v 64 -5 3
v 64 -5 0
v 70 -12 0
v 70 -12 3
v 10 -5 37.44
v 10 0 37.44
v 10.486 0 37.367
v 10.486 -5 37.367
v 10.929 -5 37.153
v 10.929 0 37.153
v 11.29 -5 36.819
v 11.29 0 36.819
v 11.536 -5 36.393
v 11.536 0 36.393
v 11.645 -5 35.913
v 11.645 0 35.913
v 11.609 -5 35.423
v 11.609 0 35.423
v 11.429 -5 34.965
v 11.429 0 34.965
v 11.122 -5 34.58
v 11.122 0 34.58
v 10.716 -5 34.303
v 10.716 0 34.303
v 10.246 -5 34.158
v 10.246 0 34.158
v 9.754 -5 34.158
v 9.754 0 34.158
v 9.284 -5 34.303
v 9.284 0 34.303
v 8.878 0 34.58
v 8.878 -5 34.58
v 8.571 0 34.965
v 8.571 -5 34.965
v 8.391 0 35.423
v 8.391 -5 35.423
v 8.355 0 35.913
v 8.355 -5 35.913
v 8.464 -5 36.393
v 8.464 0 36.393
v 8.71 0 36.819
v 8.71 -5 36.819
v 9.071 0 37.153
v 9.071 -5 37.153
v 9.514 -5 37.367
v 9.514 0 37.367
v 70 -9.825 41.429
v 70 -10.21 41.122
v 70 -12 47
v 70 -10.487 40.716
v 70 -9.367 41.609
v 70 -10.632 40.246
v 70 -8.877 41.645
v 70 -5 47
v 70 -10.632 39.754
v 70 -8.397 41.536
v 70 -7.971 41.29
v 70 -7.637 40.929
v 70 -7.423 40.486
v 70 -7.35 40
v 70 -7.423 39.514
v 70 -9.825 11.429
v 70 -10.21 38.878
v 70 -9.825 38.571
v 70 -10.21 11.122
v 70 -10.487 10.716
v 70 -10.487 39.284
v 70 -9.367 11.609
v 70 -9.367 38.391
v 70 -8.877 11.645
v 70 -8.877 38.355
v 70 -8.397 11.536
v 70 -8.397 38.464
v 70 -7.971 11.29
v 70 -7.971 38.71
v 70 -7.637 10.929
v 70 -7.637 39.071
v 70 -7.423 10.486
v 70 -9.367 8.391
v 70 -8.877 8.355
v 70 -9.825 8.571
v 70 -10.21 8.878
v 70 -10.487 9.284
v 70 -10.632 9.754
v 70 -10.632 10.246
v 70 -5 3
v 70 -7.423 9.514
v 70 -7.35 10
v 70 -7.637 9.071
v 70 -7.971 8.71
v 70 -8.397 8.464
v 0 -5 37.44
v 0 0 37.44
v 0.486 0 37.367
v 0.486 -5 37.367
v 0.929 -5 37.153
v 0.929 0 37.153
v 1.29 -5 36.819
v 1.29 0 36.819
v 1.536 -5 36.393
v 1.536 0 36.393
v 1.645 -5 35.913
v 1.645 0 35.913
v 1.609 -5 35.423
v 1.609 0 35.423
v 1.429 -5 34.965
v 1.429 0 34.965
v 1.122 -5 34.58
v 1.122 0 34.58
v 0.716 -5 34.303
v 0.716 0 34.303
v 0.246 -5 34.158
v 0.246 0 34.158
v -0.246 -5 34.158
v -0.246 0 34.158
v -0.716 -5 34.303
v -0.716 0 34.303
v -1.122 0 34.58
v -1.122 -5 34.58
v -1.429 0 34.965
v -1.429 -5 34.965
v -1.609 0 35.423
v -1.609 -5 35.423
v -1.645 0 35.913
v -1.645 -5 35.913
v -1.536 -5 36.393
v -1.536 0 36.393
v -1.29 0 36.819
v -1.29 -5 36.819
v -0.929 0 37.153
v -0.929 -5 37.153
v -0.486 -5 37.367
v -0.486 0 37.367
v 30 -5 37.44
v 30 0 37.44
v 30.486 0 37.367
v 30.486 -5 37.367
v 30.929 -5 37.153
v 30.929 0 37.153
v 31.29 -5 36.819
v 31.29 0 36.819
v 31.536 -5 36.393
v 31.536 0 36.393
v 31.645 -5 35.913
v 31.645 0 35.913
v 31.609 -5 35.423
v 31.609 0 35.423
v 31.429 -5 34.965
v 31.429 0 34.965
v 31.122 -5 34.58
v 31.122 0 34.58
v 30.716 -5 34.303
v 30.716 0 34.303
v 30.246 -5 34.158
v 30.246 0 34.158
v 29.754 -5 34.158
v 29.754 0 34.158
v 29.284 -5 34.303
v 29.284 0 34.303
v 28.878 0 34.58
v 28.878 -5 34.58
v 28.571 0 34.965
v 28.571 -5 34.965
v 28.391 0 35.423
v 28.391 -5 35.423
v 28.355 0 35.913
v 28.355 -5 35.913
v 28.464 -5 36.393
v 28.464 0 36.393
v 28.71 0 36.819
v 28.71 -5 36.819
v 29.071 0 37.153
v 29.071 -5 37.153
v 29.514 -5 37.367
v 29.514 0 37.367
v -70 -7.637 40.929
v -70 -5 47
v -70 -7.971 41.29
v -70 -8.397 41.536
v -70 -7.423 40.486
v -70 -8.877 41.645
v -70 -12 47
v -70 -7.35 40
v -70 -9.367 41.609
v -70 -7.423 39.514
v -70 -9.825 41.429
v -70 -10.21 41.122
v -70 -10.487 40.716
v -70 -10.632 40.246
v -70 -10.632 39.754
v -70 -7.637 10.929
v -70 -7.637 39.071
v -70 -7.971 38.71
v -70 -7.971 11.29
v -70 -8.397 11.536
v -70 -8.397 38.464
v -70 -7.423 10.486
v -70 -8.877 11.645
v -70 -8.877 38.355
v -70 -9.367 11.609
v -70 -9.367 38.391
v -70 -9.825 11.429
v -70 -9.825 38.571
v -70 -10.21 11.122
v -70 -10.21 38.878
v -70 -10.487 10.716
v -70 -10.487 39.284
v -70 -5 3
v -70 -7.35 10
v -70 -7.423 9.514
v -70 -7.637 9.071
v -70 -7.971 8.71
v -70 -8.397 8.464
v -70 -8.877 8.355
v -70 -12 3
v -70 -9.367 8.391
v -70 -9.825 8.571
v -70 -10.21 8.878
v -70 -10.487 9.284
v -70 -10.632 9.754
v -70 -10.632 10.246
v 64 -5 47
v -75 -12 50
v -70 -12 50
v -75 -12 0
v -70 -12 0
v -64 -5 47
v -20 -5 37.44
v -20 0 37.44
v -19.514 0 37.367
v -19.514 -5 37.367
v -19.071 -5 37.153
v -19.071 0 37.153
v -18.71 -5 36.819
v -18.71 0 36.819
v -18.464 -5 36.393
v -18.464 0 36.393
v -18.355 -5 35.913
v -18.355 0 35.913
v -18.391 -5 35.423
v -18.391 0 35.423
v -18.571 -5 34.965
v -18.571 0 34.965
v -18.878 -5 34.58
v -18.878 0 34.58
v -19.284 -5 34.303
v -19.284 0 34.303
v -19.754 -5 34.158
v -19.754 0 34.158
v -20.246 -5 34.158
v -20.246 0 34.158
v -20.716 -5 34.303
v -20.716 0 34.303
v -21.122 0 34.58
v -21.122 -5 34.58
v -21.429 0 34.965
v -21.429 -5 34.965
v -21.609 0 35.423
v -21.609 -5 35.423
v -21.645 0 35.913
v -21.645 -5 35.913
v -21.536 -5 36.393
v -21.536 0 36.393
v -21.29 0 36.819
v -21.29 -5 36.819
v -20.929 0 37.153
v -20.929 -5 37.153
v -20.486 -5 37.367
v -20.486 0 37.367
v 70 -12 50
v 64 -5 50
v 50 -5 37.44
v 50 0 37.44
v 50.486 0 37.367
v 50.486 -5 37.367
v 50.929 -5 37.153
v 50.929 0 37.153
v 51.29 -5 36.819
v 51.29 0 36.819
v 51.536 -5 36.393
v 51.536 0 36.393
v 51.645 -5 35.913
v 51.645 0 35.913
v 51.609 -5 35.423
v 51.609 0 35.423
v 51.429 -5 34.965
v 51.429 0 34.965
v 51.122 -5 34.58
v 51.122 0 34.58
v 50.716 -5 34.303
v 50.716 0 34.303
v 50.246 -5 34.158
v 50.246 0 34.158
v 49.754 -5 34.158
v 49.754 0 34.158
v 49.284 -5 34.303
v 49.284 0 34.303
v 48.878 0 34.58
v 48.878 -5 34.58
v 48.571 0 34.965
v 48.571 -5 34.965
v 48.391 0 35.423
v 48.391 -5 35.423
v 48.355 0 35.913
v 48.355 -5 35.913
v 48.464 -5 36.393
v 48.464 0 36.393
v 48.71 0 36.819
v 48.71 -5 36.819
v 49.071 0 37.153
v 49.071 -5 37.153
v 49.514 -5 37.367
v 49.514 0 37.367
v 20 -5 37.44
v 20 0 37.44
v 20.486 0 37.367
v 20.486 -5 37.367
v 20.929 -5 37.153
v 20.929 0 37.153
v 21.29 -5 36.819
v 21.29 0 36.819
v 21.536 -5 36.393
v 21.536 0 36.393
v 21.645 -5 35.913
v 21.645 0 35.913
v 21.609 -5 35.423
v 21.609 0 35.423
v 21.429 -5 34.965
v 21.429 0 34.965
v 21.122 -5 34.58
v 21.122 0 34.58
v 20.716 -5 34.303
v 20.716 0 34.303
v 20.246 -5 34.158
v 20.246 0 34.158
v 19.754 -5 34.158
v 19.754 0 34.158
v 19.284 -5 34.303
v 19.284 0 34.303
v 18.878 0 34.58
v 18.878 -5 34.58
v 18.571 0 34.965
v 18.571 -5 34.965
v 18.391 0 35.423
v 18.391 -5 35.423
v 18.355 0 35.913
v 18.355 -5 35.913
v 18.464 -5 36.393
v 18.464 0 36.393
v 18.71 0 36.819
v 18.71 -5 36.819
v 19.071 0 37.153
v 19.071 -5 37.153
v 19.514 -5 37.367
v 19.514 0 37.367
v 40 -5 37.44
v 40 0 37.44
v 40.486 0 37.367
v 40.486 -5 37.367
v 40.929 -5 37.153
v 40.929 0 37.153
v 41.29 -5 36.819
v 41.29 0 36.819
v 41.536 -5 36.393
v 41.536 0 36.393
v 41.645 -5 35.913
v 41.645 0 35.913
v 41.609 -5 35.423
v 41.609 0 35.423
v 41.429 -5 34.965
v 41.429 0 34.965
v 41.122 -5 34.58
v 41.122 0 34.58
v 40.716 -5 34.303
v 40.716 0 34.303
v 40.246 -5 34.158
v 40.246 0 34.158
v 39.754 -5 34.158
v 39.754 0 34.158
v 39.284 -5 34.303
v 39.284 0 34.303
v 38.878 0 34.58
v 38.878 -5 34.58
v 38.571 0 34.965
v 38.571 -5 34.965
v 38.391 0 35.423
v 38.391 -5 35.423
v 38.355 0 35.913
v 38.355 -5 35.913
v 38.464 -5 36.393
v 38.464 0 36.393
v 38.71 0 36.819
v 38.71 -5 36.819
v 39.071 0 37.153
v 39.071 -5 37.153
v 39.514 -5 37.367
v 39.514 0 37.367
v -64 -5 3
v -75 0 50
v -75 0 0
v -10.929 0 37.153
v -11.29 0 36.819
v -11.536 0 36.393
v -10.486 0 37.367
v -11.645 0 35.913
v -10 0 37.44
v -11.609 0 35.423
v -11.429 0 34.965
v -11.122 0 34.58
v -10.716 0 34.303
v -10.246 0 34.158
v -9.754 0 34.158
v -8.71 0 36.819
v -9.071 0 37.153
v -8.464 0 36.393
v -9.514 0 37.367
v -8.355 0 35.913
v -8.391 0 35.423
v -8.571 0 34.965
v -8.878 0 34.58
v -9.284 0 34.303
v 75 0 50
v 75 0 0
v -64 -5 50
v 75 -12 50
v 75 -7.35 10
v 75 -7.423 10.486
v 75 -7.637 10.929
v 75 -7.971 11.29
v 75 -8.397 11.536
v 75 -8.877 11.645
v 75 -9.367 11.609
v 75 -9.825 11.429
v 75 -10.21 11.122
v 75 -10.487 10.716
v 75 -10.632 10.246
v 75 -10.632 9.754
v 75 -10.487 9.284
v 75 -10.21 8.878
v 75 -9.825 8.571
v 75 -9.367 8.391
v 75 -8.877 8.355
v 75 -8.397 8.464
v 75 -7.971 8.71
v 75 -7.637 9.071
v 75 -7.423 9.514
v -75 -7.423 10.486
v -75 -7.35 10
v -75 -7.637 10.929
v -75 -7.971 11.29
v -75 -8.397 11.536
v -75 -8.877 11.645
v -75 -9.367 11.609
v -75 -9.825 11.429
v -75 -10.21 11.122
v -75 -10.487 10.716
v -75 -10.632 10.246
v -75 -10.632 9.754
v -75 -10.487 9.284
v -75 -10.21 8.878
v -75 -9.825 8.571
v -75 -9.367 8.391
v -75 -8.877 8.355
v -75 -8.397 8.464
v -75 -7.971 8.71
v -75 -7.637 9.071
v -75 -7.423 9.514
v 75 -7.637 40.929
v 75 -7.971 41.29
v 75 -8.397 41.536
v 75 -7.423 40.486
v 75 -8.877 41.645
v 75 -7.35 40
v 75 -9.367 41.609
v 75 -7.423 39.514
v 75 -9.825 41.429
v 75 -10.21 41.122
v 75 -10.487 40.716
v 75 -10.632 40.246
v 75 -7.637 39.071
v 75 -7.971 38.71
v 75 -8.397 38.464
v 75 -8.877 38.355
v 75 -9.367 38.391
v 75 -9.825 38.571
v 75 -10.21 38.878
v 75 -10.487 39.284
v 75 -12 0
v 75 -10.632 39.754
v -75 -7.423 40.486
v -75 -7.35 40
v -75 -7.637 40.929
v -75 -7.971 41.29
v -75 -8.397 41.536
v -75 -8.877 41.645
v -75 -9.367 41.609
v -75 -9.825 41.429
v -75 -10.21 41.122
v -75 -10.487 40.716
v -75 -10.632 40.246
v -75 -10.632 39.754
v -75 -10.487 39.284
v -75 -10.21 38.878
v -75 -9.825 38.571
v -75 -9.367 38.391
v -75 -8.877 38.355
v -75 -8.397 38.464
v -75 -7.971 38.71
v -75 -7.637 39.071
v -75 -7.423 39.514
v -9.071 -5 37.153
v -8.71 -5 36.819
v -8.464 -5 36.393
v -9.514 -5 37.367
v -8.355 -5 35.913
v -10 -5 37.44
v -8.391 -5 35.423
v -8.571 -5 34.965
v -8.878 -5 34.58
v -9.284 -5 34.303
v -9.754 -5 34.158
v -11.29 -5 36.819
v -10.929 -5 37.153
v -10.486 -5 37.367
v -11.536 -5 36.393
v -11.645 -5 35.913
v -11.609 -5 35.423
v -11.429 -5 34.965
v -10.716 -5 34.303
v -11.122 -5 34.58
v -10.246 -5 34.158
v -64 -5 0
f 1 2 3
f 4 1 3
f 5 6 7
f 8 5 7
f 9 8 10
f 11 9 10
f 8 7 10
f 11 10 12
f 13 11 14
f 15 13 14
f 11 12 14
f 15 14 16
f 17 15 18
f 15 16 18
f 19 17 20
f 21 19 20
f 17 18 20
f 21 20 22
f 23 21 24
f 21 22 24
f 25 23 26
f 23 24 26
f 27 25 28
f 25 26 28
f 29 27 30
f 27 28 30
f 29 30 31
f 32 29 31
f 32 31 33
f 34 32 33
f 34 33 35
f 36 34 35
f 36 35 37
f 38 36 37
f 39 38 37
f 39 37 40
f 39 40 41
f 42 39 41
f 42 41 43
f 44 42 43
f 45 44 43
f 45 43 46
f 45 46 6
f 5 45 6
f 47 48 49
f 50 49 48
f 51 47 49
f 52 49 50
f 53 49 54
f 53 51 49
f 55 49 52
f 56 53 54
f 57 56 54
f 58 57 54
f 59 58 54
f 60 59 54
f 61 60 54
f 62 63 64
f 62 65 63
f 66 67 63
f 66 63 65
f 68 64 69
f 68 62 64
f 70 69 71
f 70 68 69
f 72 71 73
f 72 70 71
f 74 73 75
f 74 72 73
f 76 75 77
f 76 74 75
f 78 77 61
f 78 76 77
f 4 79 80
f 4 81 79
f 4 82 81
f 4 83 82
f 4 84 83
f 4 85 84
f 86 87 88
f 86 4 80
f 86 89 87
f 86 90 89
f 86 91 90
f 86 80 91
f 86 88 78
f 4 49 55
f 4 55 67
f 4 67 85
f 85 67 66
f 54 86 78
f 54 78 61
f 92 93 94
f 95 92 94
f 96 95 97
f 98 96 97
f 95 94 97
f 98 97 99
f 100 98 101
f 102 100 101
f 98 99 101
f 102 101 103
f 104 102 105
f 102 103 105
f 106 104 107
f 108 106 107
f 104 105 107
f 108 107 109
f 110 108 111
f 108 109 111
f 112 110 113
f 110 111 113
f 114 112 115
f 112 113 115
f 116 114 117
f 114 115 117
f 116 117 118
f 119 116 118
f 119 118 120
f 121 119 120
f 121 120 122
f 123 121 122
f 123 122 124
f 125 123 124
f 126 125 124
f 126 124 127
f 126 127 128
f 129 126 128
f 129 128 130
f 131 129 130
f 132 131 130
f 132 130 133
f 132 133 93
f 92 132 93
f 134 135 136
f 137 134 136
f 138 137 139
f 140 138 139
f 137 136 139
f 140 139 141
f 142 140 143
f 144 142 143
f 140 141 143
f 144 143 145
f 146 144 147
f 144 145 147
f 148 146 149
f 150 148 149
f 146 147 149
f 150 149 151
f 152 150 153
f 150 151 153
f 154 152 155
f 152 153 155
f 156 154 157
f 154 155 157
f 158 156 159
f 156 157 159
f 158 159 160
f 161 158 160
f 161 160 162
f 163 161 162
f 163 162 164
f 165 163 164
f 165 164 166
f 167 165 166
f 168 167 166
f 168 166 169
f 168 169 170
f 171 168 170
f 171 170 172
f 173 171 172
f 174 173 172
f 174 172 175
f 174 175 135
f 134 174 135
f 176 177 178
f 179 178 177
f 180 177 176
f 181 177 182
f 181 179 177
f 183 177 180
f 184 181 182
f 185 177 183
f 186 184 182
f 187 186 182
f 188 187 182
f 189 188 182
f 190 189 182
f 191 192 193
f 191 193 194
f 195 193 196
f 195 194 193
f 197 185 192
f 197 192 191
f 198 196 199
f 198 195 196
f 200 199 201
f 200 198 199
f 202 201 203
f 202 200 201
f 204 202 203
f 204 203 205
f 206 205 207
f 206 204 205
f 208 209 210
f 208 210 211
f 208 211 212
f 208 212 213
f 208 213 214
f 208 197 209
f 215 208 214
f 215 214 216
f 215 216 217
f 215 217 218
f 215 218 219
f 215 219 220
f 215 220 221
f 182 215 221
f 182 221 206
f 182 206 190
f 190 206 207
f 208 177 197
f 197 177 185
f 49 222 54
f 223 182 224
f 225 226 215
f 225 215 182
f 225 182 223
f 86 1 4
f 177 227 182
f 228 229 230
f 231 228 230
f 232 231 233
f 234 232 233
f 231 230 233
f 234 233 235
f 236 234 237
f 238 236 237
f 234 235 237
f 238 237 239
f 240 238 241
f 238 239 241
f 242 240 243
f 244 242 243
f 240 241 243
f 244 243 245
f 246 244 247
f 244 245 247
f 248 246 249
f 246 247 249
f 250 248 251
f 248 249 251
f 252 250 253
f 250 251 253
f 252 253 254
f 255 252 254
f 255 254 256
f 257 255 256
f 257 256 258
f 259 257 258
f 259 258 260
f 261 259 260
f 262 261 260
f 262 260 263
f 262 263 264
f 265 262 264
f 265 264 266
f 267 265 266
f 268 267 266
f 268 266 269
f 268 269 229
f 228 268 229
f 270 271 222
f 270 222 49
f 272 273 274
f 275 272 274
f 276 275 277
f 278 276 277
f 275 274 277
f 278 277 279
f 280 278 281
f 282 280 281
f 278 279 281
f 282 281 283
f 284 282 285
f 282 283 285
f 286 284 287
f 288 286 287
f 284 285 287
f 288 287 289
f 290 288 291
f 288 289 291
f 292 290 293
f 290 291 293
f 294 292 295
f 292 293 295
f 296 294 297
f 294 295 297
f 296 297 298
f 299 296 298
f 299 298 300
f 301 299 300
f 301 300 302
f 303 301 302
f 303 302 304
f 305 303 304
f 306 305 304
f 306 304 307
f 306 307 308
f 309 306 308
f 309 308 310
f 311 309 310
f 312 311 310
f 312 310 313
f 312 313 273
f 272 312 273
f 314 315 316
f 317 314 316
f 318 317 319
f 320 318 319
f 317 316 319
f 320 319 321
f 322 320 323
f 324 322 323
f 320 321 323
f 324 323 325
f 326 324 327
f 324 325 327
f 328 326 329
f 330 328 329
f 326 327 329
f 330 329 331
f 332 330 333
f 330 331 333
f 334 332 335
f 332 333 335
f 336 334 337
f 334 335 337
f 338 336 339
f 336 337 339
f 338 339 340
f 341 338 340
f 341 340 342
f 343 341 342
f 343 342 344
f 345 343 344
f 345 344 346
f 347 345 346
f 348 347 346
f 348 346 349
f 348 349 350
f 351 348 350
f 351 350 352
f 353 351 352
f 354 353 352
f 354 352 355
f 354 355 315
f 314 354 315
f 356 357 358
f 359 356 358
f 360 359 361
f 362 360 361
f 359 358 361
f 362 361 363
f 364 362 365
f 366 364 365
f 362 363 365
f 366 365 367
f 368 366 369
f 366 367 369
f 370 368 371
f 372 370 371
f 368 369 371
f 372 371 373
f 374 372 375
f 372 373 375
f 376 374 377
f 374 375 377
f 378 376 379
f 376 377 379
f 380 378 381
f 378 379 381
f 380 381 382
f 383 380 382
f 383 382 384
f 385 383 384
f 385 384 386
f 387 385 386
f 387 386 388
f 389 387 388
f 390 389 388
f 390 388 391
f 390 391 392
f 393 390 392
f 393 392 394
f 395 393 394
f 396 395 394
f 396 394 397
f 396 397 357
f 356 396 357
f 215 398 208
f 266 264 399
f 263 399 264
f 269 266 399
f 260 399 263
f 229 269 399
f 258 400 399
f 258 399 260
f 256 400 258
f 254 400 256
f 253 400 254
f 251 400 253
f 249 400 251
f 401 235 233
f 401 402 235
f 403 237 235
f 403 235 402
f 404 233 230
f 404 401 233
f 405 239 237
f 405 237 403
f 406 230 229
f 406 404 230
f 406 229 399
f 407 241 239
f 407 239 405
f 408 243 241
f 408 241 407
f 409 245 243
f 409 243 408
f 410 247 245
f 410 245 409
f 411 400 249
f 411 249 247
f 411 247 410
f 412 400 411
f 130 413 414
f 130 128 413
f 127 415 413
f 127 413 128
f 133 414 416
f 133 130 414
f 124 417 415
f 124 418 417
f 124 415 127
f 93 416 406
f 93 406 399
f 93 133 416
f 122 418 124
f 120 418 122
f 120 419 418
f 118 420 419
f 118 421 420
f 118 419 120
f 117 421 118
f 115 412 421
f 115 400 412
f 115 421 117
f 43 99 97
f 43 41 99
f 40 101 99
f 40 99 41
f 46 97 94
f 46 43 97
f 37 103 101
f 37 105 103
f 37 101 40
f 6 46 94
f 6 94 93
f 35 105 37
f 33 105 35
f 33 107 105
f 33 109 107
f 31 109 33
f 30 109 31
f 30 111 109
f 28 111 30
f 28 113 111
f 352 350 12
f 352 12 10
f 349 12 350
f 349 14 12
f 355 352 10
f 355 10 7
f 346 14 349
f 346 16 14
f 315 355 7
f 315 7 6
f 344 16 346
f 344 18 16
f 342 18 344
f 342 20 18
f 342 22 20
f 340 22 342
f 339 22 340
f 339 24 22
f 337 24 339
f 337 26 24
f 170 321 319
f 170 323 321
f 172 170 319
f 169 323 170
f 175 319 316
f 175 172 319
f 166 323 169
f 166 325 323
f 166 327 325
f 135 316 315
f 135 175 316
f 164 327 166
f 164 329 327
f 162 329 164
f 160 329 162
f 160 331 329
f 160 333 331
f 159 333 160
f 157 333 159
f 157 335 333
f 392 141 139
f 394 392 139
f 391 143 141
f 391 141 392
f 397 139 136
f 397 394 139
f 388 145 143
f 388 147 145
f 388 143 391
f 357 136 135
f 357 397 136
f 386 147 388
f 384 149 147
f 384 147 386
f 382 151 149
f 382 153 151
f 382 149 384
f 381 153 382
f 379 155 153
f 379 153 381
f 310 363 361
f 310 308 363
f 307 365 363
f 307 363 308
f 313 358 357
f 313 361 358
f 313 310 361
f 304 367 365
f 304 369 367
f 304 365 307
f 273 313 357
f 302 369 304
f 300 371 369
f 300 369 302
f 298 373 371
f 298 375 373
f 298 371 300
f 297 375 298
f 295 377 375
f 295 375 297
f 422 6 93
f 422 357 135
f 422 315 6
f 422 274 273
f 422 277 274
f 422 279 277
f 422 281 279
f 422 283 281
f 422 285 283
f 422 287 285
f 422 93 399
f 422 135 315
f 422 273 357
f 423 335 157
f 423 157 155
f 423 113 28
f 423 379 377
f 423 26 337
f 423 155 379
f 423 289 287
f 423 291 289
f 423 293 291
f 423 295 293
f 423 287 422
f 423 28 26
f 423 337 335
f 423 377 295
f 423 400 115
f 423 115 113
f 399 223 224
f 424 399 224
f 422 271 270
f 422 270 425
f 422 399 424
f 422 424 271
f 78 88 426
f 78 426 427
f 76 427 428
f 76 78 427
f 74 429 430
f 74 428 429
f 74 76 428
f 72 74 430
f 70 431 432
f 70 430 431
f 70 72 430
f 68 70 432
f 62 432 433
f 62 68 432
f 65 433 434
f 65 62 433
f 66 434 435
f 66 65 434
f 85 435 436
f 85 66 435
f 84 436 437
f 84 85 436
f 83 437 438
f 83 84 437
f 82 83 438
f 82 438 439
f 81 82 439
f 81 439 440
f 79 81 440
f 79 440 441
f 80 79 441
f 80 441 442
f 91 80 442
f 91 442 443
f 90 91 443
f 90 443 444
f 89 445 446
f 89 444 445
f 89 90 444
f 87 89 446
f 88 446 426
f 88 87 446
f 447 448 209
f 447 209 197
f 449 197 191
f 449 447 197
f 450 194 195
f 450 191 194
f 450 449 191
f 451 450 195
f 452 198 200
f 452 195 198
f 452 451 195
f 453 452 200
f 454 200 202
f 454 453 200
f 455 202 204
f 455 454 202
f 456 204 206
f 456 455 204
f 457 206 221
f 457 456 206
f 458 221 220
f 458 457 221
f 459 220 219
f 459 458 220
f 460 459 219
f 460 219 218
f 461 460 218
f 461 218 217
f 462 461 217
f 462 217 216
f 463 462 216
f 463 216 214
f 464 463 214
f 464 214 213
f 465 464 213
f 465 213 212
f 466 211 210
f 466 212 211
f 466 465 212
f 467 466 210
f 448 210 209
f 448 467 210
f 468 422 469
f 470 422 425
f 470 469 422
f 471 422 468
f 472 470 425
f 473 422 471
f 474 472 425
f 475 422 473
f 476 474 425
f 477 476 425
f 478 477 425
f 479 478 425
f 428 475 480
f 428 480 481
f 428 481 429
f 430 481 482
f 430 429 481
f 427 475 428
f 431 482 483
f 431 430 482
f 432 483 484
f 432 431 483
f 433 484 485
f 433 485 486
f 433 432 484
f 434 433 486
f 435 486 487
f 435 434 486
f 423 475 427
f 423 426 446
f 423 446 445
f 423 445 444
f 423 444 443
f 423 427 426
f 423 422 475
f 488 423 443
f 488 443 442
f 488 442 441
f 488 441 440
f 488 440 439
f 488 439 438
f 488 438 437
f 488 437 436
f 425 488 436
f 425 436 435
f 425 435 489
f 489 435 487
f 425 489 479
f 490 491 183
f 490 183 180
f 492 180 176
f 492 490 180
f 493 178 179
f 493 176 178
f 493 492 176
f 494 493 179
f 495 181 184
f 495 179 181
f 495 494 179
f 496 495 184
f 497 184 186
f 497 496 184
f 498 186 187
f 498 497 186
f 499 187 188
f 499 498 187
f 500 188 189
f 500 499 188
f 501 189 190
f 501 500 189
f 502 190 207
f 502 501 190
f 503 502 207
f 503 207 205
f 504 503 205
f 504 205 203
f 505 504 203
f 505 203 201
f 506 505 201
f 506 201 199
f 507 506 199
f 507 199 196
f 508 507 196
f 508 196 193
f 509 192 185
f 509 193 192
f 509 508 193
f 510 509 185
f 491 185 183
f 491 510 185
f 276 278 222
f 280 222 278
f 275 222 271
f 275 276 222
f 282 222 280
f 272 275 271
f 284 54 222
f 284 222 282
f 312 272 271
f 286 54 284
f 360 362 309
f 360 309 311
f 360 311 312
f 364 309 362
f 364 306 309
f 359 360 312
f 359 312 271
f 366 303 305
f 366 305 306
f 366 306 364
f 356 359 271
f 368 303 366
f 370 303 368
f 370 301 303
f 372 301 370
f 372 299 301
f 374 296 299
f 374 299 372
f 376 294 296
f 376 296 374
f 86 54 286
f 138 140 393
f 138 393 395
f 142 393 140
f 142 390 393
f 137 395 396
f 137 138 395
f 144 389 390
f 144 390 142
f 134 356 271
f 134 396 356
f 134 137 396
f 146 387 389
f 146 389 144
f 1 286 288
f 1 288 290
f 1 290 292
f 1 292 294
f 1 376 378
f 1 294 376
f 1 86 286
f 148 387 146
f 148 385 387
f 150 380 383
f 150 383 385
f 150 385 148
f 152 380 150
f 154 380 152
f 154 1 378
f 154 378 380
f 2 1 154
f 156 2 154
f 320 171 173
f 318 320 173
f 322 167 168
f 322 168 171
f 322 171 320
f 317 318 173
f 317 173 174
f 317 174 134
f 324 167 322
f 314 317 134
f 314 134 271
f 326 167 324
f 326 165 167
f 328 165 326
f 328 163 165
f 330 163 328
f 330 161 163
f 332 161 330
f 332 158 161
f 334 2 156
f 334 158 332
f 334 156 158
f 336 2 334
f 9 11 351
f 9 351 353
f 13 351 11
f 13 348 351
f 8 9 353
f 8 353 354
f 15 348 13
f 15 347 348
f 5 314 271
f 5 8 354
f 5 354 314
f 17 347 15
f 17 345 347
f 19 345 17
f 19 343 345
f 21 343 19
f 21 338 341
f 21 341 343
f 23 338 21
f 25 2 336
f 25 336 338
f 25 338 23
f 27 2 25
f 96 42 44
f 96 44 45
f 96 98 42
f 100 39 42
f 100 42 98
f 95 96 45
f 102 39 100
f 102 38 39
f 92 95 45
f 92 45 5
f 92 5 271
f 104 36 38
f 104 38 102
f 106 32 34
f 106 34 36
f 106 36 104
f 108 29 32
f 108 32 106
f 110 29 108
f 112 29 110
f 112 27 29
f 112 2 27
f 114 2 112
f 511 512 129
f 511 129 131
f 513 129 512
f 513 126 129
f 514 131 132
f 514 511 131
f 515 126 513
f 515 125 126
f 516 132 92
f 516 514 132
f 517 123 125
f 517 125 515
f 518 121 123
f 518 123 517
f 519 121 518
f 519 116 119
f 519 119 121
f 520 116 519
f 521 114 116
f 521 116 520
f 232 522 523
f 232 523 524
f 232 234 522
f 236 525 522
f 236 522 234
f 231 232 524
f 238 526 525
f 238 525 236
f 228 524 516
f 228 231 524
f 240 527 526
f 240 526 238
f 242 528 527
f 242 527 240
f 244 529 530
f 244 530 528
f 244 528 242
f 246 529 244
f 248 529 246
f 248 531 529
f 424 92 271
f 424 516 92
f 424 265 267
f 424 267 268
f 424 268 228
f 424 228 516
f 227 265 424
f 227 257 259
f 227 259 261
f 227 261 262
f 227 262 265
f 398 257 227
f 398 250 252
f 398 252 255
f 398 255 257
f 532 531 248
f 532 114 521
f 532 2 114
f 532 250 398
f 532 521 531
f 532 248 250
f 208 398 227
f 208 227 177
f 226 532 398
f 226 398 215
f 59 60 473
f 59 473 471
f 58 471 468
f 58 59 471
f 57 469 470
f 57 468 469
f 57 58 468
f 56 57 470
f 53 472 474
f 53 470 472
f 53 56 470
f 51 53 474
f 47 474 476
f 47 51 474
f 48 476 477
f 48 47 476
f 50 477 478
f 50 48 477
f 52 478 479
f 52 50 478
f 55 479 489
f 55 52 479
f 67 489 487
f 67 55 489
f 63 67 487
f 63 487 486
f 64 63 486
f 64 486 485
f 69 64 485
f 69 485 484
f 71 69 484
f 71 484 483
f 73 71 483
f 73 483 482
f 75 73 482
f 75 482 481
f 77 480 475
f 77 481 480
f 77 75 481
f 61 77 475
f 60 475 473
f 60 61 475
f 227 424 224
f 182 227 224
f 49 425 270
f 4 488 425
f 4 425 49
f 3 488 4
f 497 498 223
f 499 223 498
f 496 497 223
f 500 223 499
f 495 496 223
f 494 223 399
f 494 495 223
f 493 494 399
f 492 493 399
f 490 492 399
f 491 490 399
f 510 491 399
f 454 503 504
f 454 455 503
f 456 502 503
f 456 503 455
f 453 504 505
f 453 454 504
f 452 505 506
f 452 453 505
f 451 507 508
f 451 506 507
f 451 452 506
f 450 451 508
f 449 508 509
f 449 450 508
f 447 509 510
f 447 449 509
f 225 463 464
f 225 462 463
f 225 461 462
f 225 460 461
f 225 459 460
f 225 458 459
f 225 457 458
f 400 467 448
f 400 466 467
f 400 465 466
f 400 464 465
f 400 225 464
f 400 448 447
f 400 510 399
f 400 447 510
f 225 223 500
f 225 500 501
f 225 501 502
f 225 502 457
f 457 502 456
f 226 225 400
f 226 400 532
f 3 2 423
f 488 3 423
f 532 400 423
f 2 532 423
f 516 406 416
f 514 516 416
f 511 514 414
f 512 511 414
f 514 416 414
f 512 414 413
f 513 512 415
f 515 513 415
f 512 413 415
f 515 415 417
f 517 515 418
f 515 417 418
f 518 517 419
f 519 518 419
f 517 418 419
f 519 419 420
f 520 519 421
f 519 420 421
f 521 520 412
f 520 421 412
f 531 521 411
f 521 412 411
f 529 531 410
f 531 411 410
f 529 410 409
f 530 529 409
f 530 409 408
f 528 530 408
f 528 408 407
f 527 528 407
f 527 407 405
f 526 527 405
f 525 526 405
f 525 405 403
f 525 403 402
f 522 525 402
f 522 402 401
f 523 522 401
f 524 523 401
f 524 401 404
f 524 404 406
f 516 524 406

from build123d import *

# Parameters (mm, degrees)
EXTRUDE_2_DEPTH          = 50
CUT_EXTRUDE_1_DEPTH      = 154.847326919
CUT_EXTRUDE_1_DEPTH_BACK = 154.847326919
SKETCH_3_R               = 1.65
EXTRUDE_3_DEPTH          = 3
MIRROR_2_COPY_1_DEPTH    = 3
SKETCH_7_R               = 1.65
CUT_EXTRUDE_2_DEPTH      = 10


with BuildPart() as part:
    # 草图1 → 凸台-拉伸2 (new body)
    with BuildSketch(Plane.XY):
        Polygon((-75, 0), (75, 0), (75, -12), (70, -12), (70, -5), (-70, -5), (-70, -12), (-75, -12), align=None)
    extrude(amount=EXTRUDE_2_DEPTH)

    # 草图3 → 切除-拉伸1 (cut, two sides: drawn at the far end of the back side and taken through both)
    with BuildSketch(Plane(origin=(-70, 0, 0), x_dir=(0, 0, -1), z_dir=(1, 0, 0)).offset(-CUT_EXTRUDE_1_DEPTH_BACK)):
        with Locations(Location((-10, -9, 0), (0, 0, 90))):
            Circle(SKETCH_3_R)
        with Locations(Location((-40, -9, 0), (0, 0, 90))):
            Circle(SKETCH_3_R)
    extrude(amount=CUT_EXTRUDE_1_DEPTH + CUT_EXTRUDE_1_DEPTH_BACK, mode=Mode.SUBTRACT)

    # 草图4 → 凸台-拉伸3 (add)
    with BuildSketch(Plane(origin=(0, 0, 0), x_dir=(-1, 0, 0), z_dir=(0, 0, -1))):
        Polygon((64, -5), (70, -12), (70, -5), align=None)
    extrude_3 = extrude(amount=-EXTRUDE_3_DEPTH)

    # 镜向1: 凸台-拉伸3 across plane
    add(extrude_3.mirror(Plane.XY.offset(25)))

    # 镜向2: 凸台-拉伸3 across plane
    add(extrude_3.mirror(Plane(origin=(0, 0, 0), x_dir=(0, 0, 1), z_dir=(1, 0, 0))))

    # 镜向2 copy 1 sketch → 镜向2 copy 1 (add)
    with BuildSketch(Plane.XY.offset(50)):
        Polygon((64, -5), (70, -12), (70, -5), align=None)
    extrude(amount=-MIRROR_2_COPY_1_DEPTH)

    # 草图7 → 切除-拉伸2 (cut)
    with BuildSketch(Plane(origin=(0, 0, 0), x_dir=(1, 0, 0), z_dir=(0, 1, 0))):
        with Locations(Location((50, -35.79, 0), (0, 0, 270))):
            Circle(SKETCH_7_R)
        with Locations(Location((40, -35.79, 0), (0, 0, 270))):
            Circle(SKETCH_7_R)
        with Locations(Location((30, -35.79, 0), (0, 0, 270))):
            Circle(SKETCH_7_R)
        with Locations(Location((20, -35.79, 0), (0, 0, 270))):
            Circle(SKETCH_7_R)
        with Locations(Location((10, -35.79, 0), (0, 0, 270))):
            Circle(SKETCH_7_R)
        with Locations(Location((0, -35.79, 0), (0, 0, 270))):
            Circle(SKETCH_7_R)
        with Locations(Location((-10, -35.79, 0), (0, 0, 270))):
            Circle(SKETCH_7_R)
        with Locations(Location((-20, -35.79, 0), (0, 0, 270))):
            Circle(SKETCH_7_R)
    extrude(amount=-CUT_EXTRUDE_2_DEPTH, mode=Mode.SUBTRACT)


solid = part.part
